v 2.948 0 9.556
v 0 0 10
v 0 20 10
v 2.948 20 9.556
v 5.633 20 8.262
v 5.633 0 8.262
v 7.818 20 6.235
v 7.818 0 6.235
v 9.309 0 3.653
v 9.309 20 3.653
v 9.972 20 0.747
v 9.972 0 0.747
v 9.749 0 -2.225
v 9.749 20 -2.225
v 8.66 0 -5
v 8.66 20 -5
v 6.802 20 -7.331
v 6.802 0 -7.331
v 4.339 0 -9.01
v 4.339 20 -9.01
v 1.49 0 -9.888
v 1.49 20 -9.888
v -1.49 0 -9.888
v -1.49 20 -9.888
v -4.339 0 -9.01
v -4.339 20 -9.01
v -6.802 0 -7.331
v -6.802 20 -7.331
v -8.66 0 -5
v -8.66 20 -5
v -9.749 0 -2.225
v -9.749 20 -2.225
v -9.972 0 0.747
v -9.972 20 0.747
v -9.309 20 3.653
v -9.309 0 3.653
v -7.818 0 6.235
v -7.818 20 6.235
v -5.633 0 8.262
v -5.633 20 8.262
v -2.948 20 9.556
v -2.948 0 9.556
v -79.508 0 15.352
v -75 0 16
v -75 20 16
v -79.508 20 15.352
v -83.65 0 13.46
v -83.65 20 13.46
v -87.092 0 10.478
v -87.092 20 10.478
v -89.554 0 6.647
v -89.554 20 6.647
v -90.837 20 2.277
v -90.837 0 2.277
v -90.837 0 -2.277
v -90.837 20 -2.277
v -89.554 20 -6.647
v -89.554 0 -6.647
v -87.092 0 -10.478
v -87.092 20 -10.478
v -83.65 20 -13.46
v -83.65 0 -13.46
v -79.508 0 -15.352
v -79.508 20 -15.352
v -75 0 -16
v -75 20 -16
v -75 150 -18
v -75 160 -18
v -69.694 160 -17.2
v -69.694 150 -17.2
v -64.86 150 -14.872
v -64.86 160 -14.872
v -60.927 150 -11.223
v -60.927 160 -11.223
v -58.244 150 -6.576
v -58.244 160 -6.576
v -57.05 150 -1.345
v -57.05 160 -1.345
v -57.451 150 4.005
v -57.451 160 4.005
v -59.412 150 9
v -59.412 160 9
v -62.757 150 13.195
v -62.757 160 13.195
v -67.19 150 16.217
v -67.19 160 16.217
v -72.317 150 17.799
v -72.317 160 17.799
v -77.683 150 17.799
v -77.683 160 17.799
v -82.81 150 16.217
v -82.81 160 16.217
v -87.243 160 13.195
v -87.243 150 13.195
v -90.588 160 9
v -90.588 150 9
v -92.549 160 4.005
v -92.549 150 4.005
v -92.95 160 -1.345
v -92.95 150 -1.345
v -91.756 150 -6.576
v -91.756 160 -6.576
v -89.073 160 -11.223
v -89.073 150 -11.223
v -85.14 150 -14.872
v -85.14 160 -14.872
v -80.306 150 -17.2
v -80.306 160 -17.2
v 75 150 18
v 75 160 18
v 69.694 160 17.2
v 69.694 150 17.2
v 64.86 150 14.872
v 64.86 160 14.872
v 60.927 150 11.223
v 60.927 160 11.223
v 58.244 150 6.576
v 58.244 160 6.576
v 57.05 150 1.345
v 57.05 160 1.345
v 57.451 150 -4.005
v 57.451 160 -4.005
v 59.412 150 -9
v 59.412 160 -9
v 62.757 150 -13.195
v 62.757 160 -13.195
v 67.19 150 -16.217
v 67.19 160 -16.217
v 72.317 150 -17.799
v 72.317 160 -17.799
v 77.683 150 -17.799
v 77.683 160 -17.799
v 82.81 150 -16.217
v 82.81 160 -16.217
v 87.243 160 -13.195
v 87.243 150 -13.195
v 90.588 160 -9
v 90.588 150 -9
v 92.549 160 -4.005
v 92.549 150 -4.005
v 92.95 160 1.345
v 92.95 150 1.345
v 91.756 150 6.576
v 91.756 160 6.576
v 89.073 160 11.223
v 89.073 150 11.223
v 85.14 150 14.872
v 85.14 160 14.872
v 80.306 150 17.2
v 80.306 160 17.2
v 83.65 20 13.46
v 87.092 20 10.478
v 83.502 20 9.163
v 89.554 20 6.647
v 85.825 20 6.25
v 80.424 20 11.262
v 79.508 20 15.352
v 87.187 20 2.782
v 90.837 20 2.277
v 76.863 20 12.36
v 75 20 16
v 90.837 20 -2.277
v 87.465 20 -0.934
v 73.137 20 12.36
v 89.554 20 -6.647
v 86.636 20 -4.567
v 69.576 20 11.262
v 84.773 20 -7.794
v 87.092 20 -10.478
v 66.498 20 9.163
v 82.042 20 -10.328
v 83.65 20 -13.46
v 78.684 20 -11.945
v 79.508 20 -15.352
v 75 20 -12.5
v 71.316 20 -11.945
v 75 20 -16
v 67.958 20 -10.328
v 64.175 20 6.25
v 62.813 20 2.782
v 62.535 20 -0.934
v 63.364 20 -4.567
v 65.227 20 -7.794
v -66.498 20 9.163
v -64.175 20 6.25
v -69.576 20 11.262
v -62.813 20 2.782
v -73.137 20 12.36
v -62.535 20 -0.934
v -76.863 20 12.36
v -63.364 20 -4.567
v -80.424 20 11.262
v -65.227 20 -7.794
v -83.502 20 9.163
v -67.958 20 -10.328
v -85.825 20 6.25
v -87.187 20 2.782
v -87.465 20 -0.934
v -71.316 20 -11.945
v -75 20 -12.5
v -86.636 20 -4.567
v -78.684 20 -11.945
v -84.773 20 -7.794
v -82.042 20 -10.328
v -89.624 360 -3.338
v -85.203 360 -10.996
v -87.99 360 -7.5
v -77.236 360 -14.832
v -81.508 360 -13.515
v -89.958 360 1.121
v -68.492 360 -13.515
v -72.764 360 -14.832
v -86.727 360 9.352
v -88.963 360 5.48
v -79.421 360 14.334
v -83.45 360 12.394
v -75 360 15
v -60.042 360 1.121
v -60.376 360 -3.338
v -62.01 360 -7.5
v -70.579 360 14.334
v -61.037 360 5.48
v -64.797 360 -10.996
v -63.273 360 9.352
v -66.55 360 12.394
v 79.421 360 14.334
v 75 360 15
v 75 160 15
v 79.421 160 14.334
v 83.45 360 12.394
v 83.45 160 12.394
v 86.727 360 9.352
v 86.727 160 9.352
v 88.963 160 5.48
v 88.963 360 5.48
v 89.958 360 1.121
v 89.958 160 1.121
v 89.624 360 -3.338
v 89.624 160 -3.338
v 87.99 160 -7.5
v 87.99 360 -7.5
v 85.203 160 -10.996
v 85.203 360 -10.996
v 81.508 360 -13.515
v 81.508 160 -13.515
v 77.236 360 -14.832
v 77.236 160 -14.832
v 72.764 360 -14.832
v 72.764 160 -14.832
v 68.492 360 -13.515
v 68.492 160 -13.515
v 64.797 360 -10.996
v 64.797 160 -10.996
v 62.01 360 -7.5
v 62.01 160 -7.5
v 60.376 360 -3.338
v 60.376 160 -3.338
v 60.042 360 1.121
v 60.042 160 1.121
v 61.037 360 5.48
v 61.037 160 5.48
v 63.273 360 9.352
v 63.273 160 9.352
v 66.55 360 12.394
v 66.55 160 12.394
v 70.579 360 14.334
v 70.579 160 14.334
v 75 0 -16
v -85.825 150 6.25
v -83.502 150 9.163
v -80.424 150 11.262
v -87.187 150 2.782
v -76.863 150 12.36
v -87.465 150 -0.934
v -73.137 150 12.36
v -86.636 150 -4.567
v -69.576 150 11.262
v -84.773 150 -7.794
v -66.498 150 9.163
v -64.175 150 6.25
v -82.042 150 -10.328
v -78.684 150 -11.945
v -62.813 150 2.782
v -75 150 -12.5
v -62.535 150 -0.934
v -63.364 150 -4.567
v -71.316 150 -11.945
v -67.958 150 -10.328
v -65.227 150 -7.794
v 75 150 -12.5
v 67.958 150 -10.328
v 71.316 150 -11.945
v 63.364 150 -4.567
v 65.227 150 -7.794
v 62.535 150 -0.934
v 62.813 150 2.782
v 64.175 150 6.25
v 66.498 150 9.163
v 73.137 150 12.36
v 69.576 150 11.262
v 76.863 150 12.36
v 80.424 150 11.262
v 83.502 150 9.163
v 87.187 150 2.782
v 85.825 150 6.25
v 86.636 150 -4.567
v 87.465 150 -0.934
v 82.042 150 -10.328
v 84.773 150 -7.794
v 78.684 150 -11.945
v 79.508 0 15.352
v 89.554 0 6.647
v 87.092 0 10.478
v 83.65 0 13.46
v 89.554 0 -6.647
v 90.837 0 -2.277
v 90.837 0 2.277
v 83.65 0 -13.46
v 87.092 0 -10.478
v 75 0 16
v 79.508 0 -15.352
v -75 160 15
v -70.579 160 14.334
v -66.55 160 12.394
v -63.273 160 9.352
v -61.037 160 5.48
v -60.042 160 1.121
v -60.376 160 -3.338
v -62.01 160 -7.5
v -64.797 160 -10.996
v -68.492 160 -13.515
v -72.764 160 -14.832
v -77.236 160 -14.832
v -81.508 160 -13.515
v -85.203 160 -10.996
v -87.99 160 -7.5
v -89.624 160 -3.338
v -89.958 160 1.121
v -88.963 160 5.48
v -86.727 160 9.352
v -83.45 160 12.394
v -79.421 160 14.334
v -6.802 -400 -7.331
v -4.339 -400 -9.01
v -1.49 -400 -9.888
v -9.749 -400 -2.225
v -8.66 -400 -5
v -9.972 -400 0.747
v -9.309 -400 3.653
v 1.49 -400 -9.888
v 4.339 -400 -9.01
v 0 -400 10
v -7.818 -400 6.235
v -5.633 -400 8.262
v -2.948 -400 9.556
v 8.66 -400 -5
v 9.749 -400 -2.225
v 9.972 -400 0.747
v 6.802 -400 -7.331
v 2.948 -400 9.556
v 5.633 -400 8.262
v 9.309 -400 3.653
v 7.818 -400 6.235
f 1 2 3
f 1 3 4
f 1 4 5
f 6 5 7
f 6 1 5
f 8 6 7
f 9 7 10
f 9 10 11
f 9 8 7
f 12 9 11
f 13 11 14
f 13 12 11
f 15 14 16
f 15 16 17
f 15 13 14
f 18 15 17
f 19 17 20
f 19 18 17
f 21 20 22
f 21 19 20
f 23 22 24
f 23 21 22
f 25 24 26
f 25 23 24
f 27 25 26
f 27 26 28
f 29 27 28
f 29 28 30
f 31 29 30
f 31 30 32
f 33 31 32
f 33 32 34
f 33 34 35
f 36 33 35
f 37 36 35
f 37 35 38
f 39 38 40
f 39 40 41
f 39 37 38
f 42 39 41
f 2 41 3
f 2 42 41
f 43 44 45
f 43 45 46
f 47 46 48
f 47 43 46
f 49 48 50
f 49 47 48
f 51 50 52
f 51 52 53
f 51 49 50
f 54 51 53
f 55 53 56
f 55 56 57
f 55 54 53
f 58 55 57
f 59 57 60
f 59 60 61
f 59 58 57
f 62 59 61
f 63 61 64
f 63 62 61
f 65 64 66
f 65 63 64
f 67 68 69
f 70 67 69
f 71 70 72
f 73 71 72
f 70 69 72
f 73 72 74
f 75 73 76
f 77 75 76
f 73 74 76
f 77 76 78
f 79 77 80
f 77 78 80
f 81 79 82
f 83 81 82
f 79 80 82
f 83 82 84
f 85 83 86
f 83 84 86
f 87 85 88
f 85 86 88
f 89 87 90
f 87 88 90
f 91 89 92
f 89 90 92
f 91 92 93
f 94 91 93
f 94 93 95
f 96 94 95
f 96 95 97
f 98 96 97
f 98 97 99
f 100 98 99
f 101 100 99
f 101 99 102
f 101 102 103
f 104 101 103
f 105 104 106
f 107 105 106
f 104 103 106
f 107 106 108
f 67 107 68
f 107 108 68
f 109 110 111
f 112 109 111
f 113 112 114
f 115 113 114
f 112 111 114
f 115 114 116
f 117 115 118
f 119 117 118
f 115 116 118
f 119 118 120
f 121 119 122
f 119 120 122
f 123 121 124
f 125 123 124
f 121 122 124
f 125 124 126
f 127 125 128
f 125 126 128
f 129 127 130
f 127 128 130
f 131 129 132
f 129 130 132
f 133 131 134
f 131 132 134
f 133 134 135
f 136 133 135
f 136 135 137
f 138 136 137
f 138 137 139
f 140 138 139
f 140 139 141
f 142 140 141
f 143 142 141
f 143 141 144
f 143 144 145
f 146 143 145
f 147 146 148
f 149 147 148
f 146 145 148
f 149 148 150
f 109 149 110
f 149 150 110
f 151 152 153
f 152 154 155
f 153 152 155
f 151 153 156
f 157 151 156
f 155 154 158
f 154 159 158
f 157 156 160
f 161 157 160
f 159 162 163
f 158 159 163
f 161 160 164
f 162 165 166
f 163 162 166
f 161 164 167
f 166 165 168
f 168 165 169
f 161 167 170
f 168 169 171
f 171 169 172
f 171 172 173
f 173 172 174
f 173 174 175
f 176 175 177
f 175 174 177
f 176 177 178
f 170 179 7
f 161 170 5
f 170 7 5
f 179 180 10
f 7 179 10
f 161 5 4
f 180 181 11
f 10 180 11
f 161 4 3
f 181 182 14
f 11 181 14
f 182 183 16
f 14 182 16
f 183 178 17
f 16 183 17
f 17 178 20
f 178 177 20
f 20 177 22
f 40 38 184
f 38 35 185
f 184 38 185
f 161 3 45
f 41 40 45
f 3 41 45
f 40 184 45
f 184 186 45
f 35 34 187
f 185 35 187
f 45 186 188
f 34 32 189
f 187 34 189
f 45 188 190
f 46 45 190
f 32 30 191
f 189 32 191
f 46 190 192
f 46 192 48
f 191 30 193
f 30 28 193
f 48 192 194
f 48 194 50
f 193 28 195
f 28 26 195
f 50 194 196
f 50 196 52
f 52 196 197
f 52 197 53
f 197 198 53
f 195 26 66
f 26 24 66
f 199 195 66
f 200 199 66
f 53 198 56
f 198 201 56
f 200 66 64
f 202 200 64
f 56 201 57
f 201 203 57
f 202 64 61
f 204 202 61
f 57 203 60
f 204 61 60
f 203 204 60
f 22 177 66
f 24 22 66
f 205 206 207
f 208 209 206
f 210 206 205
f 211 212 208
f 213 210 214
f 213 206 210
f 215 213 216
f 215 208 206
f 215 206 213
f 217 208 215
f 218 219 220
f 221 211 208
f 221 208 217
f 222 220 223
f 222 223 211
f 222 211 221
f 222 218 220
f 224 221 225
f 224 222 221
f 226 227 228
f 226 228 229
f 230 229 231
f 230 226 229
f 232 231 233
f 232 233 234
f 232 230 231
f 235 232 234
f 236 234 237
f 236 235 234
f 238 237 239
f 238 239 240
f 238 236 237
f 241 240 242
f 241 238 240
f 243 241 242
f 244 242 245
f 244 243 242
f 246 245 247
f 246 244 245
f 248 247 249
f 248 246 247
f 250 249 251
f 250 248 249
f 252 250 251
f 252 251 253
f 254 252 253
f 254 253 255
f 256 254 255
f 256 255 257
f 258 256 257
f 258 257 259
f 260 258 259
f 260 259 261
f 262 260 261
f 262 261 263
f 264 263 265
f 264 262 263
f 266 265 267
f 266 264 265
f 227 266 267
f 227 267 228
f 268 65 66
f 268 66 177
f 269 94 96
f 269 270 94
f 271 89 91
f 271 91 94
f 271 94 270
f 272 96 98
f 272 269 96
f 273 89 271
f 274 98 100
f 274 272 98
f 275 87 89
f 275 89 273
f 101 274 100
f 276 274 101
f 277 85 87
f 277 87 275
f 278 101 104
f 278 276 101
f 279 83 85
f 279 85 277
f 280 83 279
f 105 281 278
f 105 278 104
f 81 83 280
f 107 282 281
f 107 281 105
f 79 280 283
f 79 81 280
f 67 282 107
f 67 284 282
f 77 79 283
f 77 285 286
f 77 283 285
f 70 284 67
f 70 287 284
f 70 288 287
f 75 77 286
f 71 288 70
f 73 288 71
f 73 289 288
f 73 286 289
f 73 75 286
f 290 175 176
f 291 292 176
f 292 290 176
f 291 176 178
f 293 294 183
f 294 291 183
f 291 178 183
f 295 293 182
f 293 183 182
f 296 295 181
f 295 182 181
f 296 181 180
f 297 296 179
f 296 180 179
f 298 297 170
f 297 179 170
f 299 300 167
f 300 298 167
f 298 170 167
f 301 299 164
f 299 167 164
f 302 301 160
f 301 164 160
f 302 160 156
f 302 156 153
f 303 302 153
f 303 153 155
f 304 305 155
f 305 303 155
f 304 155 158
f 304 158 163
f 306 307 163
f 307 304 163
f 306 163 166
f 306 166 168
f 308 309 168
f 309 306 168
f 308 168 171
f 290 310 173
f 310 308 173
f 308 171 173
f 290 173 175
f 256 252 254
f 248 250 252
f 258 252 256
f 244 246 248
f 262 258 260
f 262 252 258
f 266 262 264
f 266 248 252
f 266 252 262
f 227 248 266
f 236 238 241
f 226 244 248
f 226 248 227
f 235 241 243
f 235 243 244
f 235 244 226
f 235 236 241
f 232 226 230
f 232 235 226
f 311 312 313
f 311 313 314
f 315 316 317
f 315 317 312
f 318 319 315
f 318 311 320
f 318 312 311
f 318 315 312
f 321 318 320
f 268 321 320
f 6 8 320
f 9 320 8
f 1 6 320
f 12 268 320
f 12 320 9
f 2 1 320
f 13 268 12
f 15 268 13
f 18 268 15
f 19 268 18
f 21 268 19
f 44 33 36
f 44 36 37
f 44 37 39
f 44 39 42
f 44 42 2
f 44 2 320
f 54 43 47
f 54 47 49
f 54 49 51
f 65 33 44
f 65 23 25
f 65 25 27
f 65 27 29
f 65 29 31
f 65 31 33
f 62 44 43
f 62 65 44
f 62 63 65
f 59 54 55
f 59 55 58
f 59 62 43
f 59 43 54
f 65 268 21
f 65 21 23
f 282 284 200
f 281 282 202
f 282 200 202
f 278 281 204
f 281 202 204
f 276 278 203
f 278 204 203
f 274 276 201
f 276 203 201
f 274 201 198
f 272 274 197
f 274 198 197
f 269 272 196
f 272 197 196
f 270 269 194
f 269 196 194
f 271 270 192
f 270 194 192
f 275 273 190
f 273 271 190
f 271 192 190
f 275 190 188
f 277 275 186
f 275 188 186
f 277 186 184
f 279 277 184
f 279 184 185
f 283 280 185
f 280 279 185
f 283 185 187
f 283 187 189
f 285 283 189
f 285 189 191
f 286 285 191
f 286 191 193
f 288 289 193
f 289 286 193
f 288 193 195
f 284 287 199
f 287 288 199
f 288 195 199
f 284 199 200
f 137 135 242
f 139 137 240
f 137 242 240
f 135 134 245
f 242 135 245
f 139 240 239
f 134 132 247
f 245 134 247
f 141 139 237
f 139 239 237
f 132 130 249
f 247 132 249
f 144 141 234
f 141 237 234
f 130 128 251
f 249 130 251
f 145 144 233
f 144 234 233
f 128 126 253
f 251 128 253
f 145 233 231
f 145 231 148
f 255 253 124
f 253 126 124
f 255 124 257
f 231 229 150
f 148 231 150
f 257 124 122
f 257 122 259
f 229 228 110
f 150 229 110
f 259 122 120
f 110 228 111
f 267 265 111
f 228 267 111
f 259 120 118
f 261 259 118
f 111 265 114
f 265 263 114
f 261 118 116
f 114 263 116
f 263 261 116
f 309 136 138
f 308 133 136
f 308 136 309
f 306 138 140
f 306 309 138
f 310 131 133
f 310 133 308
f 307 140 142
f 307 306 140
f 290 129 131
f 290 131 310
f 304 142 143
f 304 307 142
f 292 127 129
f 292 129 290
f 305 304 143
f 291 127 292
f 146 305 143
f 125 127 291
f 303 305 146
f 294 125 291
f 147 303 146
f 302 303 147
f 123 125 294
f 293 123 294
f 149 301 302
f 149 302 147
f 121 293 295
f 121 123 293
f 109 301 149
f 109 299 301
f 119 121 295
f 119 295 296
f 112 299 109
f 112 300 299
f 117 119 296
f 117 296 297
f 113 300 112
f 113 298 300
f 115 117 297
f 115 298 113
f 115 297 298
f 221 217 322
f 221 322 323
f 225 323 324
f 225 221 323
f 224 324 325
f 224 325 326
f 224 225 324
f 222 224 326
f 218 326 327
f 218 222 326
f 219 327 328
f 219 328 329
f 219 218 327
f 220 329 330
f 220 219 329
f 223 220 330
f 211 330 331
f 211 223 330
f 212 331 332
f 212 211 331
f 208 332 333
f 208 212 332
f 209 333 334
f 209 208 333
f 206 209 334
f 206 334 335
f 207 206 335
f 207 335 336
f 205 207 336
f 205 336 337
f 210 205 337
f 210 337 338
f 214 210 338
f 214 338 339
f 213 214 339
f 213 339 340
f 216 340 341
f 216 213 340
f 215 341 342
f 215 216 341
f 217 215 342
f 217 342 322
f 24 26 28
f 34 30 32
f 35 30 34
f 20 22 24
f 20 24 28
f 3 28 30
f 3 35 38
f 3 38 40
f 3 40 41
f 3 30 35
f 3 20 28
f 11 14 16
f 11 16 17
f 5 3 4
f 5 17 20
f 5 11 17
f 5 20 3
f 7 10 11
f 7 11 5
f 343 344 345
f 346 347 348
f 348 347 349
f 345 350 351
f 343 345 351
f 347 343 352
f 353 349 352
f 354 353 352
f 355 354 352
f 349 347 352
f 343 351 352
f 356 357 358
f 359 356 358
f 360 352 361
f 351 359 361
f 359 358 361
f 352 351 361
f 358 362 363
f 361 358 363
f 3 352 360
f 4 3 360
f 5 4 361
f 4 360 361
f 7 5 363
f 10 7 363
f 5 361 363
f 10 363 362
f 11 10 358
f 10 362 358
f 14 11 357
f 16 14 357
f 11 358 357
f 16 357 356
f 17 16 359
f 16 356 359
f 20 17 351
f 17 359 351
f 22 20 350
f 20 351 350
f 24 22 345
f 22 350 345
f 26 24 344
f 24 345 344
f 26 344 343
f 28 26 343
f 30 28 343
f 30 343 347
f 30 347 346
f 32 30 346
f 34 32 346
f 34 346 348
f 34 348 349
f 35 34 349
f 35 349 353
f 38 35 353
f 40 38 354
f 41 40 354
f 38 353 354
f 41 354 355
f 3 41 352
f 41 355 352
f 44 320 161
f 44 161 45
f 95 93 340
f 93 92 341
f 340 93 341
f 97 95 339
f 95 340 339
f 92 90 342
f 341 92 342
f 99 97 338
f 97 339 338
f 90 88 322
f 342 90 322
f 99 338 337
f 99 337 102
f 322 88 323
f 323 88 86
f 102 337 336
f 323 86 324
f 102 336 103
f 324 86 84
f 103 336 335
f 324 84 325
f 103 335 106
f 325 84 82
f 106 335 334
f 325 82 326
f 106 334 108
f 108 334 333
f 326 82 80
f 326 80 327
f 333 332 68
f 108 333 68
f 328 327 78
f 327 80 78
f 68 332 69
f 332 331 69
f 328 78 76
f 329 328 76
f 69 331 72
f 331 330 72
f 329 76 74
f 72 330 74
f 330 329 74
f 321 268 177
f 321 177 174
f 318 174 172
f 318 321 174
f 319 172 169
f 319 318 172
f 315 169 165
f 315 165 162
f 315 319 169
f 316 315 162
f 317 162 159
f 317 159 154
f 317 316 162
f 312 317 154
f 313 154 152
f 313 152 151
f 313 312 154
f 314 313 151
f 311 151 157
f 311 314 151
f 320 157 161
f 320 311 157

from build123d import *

# Parameters (mm, degrees)
SKETCH1_R                = 10
SKETCH1_R_2              = 12.5
BOSS_EXTRUDE1_DEPTH      = 20
BOSS_EXTRUDE2_DEPTH      = 20
BOSS_EXTRUDE2_DEPTH_BACK = 400
SKETCH1_3_R              = 10
SKETCH1_5_R              = 12.5
BOSS_EXTRUDE3_DEPTH      = 360
SKETCH3_R                = 15
BOSS_EXTRUDE4_DEPTH      = 200
SKETCH4_R                = 18
BOSS_EXTRUDE5_DEPTH      = 10


with BuildPart() as part:
    # Sketch1 → Boss-Extrude1 (new body)
    with BuildSketch(Plane(origin=(0, 0, 0), x_dir=(1, 0, 0), z_dir=(0, 1, 0))):
        with BuildLine():
            Line((-75, 16), (75, 16))
            ThreePointArc((75, 16), (91, 0), (75, -16))
            Line((75, -16), (-75, -16))
            ThreePointArc((-75, -16), (-91, 0), (-75, 16))
        make_face()
        Circle(SKETCH1_R, mode=Mode.SUBTRACT)
        with Locations((75, 0)):
            Circle(SKETCH1_R_2, mode=Mode.SUBTRACT)
        with Locations((-75, 0)):
            Circle(SKETCH1_R_2, mode=Mode.SUBTRACT)
    extrude(amount=BOSS_EXTRUDE1_DEPTH)

    # Sketch1<5> → Boss-Extrude3 (add)
    with BuildSketch(Plane(origin=(0, 0, 0), x_dir=(1, 0, 0), z_dir=(0, 1, 0))):
        with Locations((75, 0)):
            Circle(SKETCH1_5_R)
        with Locations((-75, 0)):
            Circle(SKETCH1_5_R)
    extrude(amount=BOSS_EXTRUDE3_DEPTH)

    # Sketch3 → Boss-Extrude4 (add)
    with BuildSketch(Plane(origin=(0, 360, 0), x_dir=(1, 0, 0), z_dir=(0, 1, 0))):
        with Locations((75, 0)):
            Circle(SKETCH3_R)
        with Locations((-75, 0)):
            Circle(SKETCH3_R)
    extrude(amount=-BOSS_EXTRUDE4_DEPTH)

    # Sketch4 → Boss-Extrude5 (add)
    with BuildSketch(Plane.XZ.offset(-160)):
        with Locations((-75, 0)):
            Circle(SKETCH4_R)
        with Locations((75, 0)):
            Circle(SKETCH4_R)
    extrude(amount=BOSS_EXTRUDE5_DEPTH)


with BuildPart() as body_2:
    # Sketch1<3> → Boss-Extrude2 (new, two sides: drawn at the far end of the back side and taken through both)
    with BuildSketch(Plane(origin=(0, 0, 0), x_dir=(1, 0, 0), z_dir=(0, 1, 0)).offset(-BOSS_EXTRUDE2_DEPTH_BACK)):
        Circle(SKETCH1_3_R)
    extrude(amount=BOSS_EXTRUDE2_DEPTH + BOSS_EXTRUDE2_DEPTH_BACK)


solid = Compound([part.part, body_2.part])
